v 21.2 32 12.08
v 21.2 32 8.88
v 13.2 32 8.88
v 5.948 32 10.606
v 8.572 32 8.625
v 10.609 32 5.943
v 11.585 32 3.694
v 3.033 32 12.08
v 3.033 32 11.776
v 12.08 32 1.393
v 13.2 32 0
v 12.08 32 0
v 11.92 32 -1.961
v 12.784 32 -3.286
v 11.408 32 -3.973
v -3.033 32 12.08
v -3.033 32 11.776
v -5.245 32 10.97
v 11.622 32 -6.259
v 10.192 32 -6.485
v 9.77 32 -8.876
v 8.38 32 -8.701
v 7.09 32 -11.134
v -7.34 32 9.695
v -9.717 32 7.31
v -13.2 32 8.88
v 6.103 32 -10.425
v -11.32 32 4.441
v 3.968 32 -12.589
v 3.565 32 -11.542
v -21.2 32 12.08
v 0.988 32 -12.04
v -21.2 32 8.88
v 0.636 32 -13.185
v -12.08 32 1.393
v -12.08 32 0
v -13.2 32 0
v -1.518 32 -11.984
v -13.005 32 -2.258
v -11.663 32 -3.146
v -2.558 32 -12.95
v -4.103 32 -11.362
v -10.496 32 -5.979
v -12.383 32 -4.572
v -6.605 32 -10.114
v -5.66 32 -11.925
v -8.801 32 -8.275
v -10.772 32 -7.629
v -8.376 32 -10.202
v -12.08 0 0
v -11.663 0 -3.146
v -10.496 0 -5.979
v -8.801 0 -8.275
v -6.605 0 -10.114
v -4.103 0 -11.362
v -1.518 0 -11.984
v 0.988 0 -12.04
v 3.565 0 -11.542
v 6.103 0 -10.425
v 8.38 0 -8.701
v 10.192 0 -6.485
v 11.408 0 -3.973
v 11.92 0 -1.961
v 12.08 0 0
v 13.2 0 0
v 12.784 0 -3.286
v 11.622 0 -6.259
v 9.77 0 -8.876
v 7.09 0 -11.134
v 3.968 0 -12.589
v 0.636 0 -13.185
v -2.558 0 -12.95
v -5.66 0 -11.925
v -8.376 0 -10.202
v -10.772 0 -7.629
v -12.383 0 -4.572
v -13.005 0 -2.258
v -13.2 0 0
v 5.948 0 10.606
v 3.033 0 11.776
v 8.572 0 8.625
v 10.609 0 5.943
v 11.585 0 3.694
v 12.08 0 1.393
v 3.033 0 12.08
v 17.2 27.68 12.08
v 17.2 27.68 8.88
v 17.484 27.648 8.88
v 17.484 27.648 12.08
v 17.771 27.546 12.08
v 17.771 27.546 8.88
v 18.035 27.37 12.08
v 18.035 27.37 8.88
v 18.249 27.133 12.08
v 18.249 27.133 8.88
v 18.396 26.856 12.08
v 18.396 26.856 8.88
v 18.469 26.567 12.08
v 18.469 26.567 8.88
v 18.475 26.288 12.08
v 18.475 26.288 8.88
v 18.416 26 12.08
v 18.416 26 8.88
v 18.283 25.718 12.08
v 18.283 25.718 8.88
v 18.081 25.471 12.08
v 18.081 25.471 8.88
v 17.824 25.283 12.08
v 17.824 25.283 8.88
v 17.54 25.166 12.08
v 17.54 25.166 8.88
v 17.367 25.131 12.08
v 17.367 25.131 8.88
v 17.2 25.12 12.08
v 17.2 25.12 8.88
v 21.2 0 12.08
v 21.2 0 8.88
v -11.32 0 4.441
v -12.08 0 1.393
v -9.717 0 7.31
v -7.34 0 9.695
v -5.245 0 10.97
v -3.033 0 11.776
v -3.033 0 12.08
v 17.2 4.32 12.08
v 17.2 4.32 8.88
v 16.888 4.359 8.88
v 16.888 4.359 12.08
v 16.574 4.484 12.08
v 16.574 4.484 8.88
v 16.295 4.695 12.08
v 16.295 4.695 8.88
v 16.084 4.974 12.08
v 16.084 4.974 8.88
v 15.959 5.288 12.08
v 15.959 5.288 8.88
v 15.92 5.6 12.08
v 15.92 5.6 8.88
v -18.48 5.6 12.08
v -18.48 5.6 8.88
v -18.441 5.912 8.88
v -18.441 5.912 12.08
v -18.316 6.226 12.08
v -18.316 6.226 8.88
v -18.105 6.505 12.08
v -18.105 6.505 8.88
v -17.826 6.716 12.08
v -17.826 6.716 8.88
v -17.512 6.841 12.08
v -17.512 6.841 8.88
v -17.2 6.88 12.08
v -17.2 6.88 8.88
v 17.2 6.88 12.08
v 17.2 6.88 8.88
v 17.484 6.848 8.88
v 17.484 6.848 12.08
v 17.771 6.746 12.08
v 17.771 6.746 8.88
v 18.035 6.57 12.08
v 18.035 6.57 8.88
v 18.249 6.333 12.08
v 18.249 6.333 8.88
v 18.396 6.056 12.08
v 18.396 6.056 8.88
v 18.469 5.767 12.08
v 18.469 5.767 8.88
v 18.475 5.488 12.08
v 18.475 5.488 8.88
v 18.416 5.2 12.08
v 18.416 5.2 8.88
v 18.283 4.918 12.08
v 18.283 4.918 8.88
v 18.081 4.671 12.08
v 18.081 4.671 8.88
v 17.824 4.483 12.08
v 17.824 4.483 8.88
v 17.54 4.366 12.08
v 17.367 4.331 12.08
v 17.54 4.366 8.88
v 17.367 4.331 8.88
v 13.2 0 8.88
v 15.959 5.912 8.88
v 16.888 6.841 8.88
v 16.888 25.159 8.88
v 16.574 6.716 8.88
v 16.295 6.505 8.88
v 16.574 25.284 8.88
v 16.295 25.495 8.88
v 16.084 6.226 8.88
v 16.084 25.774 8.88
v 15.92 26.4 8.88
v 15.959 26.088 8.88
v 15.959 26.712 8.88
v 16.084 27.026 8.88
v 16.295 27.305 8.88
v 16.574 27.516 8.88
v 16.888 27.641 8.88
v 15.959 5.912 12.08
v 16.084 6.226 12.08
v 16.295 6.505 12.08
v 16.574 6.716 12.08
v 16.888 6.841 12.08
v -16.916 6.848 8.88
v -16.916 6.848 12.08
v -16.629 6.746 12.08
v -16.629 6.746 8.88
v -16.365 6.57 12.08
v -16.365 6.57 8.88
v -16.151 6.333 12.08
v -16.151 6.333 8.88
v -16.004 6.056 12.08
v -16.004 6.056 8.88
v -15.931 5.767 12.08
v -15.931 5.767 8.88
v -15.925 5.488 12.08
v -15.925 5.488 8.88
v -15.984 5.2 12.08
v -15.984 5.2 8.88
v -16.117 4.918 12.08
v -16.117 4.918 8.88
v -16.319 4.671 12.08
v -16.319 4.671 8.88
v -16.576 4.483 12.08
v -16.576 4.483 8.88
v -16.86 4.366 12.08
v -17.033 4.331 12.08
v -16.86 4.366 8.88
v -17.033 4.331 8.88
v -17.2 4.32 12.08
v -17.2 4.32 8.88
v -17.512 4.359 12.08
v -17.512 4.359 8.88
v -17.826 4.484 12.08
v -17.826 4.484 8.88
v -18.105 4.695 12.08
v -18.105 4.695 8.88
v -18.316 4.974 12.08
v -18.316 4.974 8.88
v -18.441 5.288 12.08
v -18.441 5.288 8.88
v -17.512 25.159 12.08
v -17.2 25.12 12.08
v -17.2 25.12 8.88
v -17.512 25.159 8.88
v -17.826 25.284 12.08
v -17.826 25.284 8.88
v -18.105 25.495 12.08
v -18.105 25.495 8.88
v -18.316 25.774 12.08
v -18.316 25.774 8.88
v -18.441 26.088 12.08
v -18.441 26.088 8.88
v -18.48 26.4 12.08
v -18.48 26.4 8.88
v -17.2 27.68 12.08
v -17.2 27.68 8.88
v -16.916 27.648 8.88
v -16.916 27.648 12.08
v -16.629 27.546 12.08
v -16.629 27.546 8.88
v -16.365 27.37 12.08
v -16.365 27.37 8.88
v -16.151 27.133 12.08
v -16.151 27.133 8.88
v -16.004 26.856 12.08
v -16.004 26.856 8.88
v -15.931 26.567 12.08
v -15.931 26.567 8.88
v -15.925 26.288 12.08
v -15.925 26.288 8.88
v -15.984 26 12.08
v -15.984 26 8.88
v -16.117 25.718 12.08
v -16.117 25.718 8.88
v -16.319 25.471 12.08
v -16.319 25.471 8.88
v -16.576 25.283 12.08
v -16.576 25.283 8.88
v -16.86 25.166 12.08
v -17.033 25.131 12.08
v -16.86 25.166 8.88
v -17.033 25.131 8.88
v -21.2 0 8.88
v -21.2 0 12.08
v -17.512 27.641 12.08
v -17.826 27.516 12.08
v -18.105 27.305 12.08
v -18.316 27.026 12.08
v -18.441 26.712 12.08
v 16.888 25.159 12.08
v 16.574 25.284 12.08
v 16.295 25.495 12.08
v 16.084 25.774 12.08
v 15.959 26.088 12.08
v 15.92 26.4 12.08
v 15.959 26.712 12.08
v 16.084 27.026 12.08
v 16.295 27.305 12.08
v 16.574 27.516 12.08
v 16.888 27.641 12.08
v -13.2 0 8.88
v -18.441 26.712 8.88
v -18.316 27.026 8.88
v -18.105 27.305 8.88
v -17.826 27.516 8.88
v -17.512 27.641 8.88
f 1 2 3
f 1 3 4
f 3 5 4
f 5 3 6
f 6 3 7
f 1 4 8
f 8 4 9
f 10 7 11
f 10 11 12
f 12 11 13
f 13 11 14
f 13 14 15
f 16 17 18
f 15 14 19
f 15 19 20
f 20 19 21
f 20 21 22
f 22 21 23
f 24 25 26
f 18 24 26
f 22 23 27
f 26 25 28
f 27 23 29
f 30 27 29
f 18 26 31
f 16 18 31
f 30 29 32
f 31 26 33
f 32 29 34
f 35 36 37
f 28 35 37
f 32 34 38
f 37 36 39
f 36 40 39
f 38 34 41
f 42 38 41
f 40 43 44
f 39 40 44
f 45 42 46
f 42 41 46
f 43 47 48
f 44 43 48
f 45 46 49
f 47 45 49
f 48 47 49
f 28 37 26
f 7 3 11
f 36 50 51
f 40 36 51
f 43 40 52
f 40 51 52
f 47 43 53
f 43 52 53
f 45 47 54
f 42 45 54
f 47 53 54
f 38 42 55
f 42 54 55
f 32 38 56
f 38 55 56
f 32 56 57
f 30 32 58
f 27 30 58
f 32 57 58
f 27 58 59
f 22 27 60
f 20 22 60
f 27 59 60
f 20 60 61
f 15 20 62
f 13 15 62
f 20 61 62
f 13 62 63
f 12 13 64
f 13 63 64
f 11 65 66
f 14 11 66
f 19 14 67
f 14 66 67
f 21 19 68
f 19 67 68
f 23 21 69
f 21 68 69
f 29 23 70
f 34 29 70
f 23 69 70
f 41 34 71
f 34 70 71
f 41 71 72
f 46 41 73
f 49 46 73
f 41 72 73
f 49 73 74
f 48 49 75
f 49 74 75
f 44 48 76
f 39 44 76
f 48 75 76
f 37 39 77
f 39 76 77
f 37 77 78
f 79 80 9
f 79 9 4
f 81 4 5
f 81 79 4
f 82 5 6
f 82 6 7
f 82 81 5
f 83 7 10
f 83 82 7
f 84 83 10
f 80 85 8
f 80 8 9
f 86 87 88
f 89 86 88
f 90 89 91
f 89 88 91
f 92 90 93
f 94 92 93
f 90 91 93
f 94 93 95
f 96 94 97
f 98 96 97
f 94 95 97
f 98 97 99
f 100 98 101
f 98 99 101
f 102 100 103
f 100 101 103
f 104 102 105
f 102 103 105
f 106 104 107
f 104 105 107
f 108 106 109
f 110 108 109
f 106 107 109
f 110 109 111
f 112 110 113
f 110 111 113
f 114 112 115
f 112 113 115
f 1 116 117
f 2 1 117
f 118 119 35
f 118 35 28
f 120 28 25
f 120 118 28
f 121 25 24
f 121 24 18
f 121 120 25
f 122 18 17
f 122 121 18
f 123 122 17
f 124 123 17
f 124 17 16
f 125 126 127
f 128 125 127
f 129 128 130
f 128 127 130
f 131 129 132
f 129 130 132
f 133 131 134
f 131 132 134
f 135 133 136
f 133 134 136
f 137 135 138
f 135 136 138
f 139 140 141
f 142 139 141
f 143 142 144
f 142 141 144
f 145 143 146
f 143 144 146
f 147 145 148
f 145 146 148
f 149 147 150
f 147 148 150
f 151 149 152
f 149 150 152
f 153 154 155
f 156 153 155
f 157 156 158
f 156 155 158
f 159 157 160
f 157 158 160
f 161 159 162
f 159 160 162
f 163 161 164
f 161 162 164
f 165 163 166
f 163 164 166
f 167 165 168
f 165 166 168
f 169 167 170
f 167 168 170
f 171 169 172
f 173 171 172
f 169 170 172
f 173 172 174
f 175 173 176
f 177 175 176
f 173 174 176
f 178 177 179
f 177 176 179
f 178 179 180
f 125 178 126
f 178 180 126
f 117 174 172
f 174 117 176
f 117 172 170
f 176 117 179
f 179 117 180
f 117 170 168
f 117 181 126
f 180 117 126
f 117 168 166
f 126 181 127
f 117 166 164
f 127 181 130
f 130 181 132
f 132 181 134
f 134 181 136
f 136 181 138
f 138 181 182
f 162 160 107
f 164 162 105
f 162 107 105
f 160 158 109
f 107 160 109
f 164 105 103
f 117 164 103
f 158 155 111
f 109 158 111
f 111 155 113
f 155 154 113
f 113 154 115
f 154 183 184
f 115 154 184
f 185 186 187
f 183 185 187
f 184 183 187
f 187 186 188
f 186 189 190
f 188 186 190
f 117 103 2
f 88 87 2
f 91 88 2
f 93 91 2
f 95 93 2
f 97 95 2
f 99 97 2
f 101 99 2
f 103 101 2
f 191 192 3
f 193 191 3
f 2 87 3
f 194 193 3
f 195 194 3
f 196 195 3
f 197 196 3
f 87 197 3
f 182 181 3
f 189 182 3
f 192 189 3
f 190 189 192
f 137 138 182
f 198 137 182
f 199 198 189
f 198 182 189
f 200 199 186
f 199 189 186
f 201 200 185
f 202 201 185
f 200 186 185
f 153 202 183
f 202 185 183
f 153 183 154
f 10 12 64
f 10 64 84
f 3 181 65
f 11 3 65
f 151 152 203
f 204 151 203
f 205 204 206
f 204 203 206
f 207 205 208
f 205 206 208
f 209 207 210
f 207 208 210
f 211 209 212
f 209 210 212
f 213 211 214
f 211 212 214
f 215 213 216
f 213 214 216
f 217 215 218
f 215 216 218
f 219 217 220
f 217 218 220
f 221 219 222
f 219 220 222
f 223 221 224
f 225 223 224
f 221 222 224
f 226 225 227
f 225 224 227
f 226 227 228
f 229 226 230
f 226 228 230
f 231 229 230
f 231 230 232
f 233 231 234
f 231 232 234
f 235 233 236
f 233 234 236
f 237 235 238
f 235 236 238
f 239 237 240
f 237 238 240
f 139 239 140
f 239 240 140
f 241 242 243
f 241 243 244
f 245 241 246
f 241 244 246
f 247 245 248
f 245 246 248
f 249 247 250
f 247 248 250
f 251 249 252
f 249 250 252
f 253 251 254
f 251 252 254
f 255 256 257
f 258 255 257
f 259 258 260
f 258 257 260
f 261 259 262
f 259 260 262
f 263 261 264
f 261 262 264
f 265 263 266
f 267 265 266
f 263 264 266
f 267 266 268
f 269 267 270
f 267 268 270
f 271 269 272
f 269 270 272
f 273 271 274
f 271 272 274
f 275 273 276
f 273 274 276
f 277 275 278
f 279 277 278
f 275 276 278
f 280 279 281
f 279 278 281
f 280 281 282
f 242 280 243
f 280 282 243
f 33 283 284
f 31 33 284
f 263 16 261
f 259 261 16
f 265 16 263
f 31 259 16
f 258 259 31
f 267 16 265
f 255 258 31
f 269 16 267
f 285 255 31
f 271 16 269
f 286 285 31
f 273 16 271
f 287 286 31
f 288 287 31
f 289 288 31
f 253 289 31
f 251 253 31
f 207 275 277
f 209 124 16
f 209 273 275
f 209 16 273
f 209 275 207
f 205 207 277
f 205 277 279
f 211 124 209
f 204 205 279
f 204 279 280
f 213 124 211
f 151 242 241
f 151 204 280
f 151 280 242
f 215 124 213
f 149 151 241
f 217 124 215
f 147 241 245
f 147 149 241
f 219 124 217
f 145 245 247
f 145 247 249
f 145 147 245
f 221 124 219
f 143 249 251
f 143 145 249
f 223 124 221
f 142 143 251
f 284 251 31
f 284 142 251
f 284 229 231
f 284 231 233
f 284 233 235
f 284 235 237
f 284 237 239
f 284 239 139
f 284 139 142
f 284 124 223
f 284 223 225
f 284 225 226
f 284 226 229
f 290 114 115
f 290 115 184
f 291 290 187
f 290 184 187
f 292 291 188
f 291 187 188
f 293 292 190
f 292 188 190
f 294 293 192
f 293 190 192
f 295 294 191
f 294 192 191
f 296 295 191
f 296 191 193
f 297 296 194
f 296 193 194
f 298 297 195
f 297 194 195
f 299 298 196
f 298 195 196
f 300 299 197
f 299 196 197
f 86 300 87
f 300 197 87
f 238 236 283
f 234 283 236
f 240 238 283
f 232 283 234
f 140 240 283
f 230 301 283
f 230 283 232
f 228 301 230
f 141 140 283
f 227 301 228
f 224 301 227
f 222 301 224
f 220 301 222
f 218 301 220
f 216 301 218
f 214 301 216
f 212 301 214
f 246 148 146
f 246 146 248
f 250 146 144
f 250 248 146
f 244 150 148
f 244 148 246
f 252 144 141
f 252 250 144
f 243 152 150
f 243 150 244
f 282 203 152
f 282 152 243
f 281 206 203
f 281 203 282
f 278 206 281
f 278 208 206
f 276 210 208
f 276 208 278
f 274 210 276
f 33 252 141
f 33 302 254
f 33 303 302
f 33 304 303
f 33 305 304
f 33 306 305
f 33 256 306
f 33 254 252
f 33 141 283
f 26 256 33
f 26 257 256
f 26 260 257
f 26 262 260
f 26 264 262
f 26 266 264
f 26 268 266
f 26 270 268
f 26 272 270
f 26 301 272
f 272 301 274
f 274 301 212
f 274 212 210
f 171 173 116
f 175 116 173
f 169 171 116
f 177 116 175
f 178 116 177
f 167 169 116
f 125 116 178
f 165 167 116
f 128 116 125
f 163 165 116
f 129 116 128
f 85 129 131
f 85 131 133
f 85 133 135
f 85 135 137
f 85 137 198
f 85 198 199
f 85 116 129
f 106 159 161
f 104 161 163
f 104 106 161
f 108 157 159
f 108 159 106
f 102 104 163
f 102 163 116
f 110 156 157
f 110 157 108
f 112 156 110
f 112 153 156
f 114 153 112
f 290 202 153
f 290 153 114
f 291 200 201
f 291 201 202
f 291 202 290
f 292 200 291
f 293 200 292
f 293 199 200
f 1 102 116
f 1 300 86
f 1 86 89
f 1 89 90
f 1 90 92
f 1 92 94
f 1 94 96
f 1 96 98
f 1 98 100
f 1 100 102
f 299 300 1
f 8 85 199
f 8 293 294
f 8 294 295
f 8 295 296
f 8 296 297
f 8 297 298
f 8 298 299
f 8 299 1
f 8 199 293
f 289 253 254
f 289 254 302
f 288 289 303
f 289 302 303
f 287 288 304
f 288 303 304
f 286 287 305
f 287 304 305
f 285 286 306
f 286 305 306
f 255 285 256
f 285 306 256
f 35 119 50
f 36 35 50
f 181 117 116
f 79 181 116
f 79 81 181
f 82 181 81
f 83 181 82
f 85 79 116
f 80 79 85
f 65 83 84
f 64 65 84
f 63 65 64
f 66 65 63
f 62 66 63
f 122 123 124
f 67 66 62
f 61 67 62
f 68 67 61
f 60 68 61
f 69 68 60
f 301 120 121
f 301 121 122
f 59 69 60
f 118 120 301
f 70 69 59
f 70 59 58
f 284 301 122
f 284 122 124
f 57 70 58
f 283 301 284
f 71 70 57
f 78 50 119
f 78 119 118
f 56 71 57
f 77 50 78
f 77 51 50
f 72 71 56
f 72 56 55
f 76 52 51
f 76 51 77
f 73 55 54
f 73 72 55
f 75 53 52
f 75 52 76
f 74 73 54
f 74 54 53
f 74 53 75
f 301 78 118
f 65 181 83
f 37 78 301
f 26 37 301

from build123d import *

# Parameters (mm, degrees)
BOSS_EXTRUDE3_DEPTH = 40
SKETCH8_W           = 4
SKETCH8_H           = 40
BOSS_EXTRUDE6_DEPTH = 10
SKETCH9_W           = 4
SKETCH9_H           = 40
BOSS_EXTRUDE7_DEPTH = 10
BOSS_EXTRUDE9_DEPTH = 40
CUT_EXTRUDE1_DEPTH  = 40
SCALE1_SCALE_X      = 0.8
SCALE1_SCALE_Y      = 0.8
SCALE1_SCALE_Z      = 0.8


with BuildPart() as part:
    # Sketch3 → Boss-Extrude3 (new body)
    with BuildSketch(Plane(origin=(0, 0, 0), x_dir=(1, 0, 0), z_dir=(0, 1, 0))):
        with BuildLine():
            ThreePointArc((16.5, 0), (0, 16.5), (-16.5, 0))
            Line((-16.5, 0), (-16.5, -15.1))
            Line((-16.5, -15.1), (-15.1, -15.1))
            Line((-15.1, -15.1), (-15.1, 0))
            ThreePointArc((-15.1, 0), (0, 15.1), (15.1, 0))
            Line((15.1, 0), (15.1, -15.1))
            Line((15.1, -15.1), (16.5, -15.1))
            Line((16.5, -15.1), (16.5, 0))
        make_face()
    extrude(amount=BOSS_EXTRUDE3_DEPTH)

    # Sketch8 → Boss-Extrude6 (add)
    with BuildSketch(Plane(origin=(16.5, 0, 0), x_dir=(0, 0, -1), z_dir=(1, 0, 0))):
        with Locations((-13.1, 20)):
            Rectangle(SKETCH8_W, SKETCH8_H)
    extrude(amount=BOSS_EXTRUDE6_DEPTH)

    # Sketch9 → Boss-Extrude7 (add)
    with BuildSketch(Plane.ZY.offset(16.5)):
        with Locations((13.1, 20)):
            Rectangle(SKETCH9_W, SKETCH9_H)
    extrude(amount=BOSS_EXTRUDE7_DEPTH)

    # Sketch10 → Boss-Extrude9 (add)
    with BuildSketch(Plane(origin=(0, 0, 0), x_dir=(-1, 0, 0), z_dir=(0, -1, 0))):
        with BuildLine():
            Line((3.791332709, -15.1), (15.1, -15.1))
            Line((15.1, -15.1), (15.1, -1.740689519))
            ThreePointArc((15.1, -1.740689519), (11.460081139, -9.985316234), (3.791332709, -14.719571879))
            Line((3.791332709, -14.719571879), (3.791332709, -15.1))
        make_face()
        with BuildLine():
            Line((-15.1, -15.1), (-3.791332709, -15.1))
            Line((-3.791332709, -15.1), (-3.791332709, -14.719571879))
            ThreePointArc((-3.791332709, -14.719571879), (-11.460081139, -9.985316234), (-15.1, -1.740689519))
            Line((-15.1, -1.740689519), (-15.1, -15.1))
        make_face()
    extrude(amount=-BOSS_EXTRUDE9_DEPTH)

    # Sketch11 → Cut-Extrude1 (cut)
    with BuildSketch(Plane(origin=(0, 0, 11.1), x_dir=(-1, 0, 0), z_dir=(0, 0, -1))):
        with BuildLine():
            ThreePointArc((-19.9, 33), (-20.36862915, 34.13137085), (-21.5, 34.6))
            Line((-21.5, 34.6), (-21.5, 31.4))
            ThreePointArc((-21.5, 31.4), (-20.36862915, 31.86862915), (-19.9, 33))
        make_face()
        with BuildLine():
            Line((-21.5, 31.4), (-21.5, 34.6))
            ThreePointArc((-21.5, 34.6), (-23.1, 33), (-21.5, 31.4))
        make_face()
        with BuildLine():
            ThreePointArc((-19.9, 7), (-20.36862915, 8.13137085), (-21.5, 8.6))
            Line((-21.5, 8.6), (-21.5, 5.4))
            ThreePointArc((-21.5, 5.4), (-20.36862915, 5.86862915), (-19.9, 7))
        make_face()
        with BuildLine():
            Line((-21.5, 5.4), (-21.5, 8.6))
            ThreePointArc((-21.5, 8.6), (-23.1, 7), (-21.5, 5.4))
        make_face()
        with BuildLine():
            ThreePointArc((23.1, 7), (22.63137085, 8.13137085), (21.5, 8.6))
            Line((21.5, 8.6), (21.5, 5.4))
            ThreePointArc((21.5, 5.4), (22.63137085, 5.86862915), (23.1, 7))
        make_face()
        with BuildLine():
            Line((21.5, 5.4), (21.5, 8.6))
            ThreePointArc((21.5, 8.6), (19.9, 7), (21.5, 5.4))
        make_face()
        with BuildLine():
            ThreePointArc((23.1, 33), (22.63137085, 34.13137085), (21.5, 34.6))
            Line((21.5, 34.6), (21.5, 31.4))
            ThreePointArc((21.5, 31.4), (22.63137085, 31.86862915), (23.1, 33))
        make_face()
        with BuildLine():
            Line((21.5, 31.4), (21.5, 34.6))
            ThreePointArc((21.5, 34.6), (19.9, 33), (21.5, 31.4))
        make_face()
    extrude(amount=-CUT_EXTRUDE1_DEPTH, mode=Mode.SUBTRACT)


with BuildPart() as part_1:
    # Scale1: scaled about (0, 0, 0)
    add(part.part.scale((SCALE1_SCALE_X, SCALE1_SCALE_Y, SCALE1_SCALE_Z), about=(0, 0, 0)))


solid = part_1.part
